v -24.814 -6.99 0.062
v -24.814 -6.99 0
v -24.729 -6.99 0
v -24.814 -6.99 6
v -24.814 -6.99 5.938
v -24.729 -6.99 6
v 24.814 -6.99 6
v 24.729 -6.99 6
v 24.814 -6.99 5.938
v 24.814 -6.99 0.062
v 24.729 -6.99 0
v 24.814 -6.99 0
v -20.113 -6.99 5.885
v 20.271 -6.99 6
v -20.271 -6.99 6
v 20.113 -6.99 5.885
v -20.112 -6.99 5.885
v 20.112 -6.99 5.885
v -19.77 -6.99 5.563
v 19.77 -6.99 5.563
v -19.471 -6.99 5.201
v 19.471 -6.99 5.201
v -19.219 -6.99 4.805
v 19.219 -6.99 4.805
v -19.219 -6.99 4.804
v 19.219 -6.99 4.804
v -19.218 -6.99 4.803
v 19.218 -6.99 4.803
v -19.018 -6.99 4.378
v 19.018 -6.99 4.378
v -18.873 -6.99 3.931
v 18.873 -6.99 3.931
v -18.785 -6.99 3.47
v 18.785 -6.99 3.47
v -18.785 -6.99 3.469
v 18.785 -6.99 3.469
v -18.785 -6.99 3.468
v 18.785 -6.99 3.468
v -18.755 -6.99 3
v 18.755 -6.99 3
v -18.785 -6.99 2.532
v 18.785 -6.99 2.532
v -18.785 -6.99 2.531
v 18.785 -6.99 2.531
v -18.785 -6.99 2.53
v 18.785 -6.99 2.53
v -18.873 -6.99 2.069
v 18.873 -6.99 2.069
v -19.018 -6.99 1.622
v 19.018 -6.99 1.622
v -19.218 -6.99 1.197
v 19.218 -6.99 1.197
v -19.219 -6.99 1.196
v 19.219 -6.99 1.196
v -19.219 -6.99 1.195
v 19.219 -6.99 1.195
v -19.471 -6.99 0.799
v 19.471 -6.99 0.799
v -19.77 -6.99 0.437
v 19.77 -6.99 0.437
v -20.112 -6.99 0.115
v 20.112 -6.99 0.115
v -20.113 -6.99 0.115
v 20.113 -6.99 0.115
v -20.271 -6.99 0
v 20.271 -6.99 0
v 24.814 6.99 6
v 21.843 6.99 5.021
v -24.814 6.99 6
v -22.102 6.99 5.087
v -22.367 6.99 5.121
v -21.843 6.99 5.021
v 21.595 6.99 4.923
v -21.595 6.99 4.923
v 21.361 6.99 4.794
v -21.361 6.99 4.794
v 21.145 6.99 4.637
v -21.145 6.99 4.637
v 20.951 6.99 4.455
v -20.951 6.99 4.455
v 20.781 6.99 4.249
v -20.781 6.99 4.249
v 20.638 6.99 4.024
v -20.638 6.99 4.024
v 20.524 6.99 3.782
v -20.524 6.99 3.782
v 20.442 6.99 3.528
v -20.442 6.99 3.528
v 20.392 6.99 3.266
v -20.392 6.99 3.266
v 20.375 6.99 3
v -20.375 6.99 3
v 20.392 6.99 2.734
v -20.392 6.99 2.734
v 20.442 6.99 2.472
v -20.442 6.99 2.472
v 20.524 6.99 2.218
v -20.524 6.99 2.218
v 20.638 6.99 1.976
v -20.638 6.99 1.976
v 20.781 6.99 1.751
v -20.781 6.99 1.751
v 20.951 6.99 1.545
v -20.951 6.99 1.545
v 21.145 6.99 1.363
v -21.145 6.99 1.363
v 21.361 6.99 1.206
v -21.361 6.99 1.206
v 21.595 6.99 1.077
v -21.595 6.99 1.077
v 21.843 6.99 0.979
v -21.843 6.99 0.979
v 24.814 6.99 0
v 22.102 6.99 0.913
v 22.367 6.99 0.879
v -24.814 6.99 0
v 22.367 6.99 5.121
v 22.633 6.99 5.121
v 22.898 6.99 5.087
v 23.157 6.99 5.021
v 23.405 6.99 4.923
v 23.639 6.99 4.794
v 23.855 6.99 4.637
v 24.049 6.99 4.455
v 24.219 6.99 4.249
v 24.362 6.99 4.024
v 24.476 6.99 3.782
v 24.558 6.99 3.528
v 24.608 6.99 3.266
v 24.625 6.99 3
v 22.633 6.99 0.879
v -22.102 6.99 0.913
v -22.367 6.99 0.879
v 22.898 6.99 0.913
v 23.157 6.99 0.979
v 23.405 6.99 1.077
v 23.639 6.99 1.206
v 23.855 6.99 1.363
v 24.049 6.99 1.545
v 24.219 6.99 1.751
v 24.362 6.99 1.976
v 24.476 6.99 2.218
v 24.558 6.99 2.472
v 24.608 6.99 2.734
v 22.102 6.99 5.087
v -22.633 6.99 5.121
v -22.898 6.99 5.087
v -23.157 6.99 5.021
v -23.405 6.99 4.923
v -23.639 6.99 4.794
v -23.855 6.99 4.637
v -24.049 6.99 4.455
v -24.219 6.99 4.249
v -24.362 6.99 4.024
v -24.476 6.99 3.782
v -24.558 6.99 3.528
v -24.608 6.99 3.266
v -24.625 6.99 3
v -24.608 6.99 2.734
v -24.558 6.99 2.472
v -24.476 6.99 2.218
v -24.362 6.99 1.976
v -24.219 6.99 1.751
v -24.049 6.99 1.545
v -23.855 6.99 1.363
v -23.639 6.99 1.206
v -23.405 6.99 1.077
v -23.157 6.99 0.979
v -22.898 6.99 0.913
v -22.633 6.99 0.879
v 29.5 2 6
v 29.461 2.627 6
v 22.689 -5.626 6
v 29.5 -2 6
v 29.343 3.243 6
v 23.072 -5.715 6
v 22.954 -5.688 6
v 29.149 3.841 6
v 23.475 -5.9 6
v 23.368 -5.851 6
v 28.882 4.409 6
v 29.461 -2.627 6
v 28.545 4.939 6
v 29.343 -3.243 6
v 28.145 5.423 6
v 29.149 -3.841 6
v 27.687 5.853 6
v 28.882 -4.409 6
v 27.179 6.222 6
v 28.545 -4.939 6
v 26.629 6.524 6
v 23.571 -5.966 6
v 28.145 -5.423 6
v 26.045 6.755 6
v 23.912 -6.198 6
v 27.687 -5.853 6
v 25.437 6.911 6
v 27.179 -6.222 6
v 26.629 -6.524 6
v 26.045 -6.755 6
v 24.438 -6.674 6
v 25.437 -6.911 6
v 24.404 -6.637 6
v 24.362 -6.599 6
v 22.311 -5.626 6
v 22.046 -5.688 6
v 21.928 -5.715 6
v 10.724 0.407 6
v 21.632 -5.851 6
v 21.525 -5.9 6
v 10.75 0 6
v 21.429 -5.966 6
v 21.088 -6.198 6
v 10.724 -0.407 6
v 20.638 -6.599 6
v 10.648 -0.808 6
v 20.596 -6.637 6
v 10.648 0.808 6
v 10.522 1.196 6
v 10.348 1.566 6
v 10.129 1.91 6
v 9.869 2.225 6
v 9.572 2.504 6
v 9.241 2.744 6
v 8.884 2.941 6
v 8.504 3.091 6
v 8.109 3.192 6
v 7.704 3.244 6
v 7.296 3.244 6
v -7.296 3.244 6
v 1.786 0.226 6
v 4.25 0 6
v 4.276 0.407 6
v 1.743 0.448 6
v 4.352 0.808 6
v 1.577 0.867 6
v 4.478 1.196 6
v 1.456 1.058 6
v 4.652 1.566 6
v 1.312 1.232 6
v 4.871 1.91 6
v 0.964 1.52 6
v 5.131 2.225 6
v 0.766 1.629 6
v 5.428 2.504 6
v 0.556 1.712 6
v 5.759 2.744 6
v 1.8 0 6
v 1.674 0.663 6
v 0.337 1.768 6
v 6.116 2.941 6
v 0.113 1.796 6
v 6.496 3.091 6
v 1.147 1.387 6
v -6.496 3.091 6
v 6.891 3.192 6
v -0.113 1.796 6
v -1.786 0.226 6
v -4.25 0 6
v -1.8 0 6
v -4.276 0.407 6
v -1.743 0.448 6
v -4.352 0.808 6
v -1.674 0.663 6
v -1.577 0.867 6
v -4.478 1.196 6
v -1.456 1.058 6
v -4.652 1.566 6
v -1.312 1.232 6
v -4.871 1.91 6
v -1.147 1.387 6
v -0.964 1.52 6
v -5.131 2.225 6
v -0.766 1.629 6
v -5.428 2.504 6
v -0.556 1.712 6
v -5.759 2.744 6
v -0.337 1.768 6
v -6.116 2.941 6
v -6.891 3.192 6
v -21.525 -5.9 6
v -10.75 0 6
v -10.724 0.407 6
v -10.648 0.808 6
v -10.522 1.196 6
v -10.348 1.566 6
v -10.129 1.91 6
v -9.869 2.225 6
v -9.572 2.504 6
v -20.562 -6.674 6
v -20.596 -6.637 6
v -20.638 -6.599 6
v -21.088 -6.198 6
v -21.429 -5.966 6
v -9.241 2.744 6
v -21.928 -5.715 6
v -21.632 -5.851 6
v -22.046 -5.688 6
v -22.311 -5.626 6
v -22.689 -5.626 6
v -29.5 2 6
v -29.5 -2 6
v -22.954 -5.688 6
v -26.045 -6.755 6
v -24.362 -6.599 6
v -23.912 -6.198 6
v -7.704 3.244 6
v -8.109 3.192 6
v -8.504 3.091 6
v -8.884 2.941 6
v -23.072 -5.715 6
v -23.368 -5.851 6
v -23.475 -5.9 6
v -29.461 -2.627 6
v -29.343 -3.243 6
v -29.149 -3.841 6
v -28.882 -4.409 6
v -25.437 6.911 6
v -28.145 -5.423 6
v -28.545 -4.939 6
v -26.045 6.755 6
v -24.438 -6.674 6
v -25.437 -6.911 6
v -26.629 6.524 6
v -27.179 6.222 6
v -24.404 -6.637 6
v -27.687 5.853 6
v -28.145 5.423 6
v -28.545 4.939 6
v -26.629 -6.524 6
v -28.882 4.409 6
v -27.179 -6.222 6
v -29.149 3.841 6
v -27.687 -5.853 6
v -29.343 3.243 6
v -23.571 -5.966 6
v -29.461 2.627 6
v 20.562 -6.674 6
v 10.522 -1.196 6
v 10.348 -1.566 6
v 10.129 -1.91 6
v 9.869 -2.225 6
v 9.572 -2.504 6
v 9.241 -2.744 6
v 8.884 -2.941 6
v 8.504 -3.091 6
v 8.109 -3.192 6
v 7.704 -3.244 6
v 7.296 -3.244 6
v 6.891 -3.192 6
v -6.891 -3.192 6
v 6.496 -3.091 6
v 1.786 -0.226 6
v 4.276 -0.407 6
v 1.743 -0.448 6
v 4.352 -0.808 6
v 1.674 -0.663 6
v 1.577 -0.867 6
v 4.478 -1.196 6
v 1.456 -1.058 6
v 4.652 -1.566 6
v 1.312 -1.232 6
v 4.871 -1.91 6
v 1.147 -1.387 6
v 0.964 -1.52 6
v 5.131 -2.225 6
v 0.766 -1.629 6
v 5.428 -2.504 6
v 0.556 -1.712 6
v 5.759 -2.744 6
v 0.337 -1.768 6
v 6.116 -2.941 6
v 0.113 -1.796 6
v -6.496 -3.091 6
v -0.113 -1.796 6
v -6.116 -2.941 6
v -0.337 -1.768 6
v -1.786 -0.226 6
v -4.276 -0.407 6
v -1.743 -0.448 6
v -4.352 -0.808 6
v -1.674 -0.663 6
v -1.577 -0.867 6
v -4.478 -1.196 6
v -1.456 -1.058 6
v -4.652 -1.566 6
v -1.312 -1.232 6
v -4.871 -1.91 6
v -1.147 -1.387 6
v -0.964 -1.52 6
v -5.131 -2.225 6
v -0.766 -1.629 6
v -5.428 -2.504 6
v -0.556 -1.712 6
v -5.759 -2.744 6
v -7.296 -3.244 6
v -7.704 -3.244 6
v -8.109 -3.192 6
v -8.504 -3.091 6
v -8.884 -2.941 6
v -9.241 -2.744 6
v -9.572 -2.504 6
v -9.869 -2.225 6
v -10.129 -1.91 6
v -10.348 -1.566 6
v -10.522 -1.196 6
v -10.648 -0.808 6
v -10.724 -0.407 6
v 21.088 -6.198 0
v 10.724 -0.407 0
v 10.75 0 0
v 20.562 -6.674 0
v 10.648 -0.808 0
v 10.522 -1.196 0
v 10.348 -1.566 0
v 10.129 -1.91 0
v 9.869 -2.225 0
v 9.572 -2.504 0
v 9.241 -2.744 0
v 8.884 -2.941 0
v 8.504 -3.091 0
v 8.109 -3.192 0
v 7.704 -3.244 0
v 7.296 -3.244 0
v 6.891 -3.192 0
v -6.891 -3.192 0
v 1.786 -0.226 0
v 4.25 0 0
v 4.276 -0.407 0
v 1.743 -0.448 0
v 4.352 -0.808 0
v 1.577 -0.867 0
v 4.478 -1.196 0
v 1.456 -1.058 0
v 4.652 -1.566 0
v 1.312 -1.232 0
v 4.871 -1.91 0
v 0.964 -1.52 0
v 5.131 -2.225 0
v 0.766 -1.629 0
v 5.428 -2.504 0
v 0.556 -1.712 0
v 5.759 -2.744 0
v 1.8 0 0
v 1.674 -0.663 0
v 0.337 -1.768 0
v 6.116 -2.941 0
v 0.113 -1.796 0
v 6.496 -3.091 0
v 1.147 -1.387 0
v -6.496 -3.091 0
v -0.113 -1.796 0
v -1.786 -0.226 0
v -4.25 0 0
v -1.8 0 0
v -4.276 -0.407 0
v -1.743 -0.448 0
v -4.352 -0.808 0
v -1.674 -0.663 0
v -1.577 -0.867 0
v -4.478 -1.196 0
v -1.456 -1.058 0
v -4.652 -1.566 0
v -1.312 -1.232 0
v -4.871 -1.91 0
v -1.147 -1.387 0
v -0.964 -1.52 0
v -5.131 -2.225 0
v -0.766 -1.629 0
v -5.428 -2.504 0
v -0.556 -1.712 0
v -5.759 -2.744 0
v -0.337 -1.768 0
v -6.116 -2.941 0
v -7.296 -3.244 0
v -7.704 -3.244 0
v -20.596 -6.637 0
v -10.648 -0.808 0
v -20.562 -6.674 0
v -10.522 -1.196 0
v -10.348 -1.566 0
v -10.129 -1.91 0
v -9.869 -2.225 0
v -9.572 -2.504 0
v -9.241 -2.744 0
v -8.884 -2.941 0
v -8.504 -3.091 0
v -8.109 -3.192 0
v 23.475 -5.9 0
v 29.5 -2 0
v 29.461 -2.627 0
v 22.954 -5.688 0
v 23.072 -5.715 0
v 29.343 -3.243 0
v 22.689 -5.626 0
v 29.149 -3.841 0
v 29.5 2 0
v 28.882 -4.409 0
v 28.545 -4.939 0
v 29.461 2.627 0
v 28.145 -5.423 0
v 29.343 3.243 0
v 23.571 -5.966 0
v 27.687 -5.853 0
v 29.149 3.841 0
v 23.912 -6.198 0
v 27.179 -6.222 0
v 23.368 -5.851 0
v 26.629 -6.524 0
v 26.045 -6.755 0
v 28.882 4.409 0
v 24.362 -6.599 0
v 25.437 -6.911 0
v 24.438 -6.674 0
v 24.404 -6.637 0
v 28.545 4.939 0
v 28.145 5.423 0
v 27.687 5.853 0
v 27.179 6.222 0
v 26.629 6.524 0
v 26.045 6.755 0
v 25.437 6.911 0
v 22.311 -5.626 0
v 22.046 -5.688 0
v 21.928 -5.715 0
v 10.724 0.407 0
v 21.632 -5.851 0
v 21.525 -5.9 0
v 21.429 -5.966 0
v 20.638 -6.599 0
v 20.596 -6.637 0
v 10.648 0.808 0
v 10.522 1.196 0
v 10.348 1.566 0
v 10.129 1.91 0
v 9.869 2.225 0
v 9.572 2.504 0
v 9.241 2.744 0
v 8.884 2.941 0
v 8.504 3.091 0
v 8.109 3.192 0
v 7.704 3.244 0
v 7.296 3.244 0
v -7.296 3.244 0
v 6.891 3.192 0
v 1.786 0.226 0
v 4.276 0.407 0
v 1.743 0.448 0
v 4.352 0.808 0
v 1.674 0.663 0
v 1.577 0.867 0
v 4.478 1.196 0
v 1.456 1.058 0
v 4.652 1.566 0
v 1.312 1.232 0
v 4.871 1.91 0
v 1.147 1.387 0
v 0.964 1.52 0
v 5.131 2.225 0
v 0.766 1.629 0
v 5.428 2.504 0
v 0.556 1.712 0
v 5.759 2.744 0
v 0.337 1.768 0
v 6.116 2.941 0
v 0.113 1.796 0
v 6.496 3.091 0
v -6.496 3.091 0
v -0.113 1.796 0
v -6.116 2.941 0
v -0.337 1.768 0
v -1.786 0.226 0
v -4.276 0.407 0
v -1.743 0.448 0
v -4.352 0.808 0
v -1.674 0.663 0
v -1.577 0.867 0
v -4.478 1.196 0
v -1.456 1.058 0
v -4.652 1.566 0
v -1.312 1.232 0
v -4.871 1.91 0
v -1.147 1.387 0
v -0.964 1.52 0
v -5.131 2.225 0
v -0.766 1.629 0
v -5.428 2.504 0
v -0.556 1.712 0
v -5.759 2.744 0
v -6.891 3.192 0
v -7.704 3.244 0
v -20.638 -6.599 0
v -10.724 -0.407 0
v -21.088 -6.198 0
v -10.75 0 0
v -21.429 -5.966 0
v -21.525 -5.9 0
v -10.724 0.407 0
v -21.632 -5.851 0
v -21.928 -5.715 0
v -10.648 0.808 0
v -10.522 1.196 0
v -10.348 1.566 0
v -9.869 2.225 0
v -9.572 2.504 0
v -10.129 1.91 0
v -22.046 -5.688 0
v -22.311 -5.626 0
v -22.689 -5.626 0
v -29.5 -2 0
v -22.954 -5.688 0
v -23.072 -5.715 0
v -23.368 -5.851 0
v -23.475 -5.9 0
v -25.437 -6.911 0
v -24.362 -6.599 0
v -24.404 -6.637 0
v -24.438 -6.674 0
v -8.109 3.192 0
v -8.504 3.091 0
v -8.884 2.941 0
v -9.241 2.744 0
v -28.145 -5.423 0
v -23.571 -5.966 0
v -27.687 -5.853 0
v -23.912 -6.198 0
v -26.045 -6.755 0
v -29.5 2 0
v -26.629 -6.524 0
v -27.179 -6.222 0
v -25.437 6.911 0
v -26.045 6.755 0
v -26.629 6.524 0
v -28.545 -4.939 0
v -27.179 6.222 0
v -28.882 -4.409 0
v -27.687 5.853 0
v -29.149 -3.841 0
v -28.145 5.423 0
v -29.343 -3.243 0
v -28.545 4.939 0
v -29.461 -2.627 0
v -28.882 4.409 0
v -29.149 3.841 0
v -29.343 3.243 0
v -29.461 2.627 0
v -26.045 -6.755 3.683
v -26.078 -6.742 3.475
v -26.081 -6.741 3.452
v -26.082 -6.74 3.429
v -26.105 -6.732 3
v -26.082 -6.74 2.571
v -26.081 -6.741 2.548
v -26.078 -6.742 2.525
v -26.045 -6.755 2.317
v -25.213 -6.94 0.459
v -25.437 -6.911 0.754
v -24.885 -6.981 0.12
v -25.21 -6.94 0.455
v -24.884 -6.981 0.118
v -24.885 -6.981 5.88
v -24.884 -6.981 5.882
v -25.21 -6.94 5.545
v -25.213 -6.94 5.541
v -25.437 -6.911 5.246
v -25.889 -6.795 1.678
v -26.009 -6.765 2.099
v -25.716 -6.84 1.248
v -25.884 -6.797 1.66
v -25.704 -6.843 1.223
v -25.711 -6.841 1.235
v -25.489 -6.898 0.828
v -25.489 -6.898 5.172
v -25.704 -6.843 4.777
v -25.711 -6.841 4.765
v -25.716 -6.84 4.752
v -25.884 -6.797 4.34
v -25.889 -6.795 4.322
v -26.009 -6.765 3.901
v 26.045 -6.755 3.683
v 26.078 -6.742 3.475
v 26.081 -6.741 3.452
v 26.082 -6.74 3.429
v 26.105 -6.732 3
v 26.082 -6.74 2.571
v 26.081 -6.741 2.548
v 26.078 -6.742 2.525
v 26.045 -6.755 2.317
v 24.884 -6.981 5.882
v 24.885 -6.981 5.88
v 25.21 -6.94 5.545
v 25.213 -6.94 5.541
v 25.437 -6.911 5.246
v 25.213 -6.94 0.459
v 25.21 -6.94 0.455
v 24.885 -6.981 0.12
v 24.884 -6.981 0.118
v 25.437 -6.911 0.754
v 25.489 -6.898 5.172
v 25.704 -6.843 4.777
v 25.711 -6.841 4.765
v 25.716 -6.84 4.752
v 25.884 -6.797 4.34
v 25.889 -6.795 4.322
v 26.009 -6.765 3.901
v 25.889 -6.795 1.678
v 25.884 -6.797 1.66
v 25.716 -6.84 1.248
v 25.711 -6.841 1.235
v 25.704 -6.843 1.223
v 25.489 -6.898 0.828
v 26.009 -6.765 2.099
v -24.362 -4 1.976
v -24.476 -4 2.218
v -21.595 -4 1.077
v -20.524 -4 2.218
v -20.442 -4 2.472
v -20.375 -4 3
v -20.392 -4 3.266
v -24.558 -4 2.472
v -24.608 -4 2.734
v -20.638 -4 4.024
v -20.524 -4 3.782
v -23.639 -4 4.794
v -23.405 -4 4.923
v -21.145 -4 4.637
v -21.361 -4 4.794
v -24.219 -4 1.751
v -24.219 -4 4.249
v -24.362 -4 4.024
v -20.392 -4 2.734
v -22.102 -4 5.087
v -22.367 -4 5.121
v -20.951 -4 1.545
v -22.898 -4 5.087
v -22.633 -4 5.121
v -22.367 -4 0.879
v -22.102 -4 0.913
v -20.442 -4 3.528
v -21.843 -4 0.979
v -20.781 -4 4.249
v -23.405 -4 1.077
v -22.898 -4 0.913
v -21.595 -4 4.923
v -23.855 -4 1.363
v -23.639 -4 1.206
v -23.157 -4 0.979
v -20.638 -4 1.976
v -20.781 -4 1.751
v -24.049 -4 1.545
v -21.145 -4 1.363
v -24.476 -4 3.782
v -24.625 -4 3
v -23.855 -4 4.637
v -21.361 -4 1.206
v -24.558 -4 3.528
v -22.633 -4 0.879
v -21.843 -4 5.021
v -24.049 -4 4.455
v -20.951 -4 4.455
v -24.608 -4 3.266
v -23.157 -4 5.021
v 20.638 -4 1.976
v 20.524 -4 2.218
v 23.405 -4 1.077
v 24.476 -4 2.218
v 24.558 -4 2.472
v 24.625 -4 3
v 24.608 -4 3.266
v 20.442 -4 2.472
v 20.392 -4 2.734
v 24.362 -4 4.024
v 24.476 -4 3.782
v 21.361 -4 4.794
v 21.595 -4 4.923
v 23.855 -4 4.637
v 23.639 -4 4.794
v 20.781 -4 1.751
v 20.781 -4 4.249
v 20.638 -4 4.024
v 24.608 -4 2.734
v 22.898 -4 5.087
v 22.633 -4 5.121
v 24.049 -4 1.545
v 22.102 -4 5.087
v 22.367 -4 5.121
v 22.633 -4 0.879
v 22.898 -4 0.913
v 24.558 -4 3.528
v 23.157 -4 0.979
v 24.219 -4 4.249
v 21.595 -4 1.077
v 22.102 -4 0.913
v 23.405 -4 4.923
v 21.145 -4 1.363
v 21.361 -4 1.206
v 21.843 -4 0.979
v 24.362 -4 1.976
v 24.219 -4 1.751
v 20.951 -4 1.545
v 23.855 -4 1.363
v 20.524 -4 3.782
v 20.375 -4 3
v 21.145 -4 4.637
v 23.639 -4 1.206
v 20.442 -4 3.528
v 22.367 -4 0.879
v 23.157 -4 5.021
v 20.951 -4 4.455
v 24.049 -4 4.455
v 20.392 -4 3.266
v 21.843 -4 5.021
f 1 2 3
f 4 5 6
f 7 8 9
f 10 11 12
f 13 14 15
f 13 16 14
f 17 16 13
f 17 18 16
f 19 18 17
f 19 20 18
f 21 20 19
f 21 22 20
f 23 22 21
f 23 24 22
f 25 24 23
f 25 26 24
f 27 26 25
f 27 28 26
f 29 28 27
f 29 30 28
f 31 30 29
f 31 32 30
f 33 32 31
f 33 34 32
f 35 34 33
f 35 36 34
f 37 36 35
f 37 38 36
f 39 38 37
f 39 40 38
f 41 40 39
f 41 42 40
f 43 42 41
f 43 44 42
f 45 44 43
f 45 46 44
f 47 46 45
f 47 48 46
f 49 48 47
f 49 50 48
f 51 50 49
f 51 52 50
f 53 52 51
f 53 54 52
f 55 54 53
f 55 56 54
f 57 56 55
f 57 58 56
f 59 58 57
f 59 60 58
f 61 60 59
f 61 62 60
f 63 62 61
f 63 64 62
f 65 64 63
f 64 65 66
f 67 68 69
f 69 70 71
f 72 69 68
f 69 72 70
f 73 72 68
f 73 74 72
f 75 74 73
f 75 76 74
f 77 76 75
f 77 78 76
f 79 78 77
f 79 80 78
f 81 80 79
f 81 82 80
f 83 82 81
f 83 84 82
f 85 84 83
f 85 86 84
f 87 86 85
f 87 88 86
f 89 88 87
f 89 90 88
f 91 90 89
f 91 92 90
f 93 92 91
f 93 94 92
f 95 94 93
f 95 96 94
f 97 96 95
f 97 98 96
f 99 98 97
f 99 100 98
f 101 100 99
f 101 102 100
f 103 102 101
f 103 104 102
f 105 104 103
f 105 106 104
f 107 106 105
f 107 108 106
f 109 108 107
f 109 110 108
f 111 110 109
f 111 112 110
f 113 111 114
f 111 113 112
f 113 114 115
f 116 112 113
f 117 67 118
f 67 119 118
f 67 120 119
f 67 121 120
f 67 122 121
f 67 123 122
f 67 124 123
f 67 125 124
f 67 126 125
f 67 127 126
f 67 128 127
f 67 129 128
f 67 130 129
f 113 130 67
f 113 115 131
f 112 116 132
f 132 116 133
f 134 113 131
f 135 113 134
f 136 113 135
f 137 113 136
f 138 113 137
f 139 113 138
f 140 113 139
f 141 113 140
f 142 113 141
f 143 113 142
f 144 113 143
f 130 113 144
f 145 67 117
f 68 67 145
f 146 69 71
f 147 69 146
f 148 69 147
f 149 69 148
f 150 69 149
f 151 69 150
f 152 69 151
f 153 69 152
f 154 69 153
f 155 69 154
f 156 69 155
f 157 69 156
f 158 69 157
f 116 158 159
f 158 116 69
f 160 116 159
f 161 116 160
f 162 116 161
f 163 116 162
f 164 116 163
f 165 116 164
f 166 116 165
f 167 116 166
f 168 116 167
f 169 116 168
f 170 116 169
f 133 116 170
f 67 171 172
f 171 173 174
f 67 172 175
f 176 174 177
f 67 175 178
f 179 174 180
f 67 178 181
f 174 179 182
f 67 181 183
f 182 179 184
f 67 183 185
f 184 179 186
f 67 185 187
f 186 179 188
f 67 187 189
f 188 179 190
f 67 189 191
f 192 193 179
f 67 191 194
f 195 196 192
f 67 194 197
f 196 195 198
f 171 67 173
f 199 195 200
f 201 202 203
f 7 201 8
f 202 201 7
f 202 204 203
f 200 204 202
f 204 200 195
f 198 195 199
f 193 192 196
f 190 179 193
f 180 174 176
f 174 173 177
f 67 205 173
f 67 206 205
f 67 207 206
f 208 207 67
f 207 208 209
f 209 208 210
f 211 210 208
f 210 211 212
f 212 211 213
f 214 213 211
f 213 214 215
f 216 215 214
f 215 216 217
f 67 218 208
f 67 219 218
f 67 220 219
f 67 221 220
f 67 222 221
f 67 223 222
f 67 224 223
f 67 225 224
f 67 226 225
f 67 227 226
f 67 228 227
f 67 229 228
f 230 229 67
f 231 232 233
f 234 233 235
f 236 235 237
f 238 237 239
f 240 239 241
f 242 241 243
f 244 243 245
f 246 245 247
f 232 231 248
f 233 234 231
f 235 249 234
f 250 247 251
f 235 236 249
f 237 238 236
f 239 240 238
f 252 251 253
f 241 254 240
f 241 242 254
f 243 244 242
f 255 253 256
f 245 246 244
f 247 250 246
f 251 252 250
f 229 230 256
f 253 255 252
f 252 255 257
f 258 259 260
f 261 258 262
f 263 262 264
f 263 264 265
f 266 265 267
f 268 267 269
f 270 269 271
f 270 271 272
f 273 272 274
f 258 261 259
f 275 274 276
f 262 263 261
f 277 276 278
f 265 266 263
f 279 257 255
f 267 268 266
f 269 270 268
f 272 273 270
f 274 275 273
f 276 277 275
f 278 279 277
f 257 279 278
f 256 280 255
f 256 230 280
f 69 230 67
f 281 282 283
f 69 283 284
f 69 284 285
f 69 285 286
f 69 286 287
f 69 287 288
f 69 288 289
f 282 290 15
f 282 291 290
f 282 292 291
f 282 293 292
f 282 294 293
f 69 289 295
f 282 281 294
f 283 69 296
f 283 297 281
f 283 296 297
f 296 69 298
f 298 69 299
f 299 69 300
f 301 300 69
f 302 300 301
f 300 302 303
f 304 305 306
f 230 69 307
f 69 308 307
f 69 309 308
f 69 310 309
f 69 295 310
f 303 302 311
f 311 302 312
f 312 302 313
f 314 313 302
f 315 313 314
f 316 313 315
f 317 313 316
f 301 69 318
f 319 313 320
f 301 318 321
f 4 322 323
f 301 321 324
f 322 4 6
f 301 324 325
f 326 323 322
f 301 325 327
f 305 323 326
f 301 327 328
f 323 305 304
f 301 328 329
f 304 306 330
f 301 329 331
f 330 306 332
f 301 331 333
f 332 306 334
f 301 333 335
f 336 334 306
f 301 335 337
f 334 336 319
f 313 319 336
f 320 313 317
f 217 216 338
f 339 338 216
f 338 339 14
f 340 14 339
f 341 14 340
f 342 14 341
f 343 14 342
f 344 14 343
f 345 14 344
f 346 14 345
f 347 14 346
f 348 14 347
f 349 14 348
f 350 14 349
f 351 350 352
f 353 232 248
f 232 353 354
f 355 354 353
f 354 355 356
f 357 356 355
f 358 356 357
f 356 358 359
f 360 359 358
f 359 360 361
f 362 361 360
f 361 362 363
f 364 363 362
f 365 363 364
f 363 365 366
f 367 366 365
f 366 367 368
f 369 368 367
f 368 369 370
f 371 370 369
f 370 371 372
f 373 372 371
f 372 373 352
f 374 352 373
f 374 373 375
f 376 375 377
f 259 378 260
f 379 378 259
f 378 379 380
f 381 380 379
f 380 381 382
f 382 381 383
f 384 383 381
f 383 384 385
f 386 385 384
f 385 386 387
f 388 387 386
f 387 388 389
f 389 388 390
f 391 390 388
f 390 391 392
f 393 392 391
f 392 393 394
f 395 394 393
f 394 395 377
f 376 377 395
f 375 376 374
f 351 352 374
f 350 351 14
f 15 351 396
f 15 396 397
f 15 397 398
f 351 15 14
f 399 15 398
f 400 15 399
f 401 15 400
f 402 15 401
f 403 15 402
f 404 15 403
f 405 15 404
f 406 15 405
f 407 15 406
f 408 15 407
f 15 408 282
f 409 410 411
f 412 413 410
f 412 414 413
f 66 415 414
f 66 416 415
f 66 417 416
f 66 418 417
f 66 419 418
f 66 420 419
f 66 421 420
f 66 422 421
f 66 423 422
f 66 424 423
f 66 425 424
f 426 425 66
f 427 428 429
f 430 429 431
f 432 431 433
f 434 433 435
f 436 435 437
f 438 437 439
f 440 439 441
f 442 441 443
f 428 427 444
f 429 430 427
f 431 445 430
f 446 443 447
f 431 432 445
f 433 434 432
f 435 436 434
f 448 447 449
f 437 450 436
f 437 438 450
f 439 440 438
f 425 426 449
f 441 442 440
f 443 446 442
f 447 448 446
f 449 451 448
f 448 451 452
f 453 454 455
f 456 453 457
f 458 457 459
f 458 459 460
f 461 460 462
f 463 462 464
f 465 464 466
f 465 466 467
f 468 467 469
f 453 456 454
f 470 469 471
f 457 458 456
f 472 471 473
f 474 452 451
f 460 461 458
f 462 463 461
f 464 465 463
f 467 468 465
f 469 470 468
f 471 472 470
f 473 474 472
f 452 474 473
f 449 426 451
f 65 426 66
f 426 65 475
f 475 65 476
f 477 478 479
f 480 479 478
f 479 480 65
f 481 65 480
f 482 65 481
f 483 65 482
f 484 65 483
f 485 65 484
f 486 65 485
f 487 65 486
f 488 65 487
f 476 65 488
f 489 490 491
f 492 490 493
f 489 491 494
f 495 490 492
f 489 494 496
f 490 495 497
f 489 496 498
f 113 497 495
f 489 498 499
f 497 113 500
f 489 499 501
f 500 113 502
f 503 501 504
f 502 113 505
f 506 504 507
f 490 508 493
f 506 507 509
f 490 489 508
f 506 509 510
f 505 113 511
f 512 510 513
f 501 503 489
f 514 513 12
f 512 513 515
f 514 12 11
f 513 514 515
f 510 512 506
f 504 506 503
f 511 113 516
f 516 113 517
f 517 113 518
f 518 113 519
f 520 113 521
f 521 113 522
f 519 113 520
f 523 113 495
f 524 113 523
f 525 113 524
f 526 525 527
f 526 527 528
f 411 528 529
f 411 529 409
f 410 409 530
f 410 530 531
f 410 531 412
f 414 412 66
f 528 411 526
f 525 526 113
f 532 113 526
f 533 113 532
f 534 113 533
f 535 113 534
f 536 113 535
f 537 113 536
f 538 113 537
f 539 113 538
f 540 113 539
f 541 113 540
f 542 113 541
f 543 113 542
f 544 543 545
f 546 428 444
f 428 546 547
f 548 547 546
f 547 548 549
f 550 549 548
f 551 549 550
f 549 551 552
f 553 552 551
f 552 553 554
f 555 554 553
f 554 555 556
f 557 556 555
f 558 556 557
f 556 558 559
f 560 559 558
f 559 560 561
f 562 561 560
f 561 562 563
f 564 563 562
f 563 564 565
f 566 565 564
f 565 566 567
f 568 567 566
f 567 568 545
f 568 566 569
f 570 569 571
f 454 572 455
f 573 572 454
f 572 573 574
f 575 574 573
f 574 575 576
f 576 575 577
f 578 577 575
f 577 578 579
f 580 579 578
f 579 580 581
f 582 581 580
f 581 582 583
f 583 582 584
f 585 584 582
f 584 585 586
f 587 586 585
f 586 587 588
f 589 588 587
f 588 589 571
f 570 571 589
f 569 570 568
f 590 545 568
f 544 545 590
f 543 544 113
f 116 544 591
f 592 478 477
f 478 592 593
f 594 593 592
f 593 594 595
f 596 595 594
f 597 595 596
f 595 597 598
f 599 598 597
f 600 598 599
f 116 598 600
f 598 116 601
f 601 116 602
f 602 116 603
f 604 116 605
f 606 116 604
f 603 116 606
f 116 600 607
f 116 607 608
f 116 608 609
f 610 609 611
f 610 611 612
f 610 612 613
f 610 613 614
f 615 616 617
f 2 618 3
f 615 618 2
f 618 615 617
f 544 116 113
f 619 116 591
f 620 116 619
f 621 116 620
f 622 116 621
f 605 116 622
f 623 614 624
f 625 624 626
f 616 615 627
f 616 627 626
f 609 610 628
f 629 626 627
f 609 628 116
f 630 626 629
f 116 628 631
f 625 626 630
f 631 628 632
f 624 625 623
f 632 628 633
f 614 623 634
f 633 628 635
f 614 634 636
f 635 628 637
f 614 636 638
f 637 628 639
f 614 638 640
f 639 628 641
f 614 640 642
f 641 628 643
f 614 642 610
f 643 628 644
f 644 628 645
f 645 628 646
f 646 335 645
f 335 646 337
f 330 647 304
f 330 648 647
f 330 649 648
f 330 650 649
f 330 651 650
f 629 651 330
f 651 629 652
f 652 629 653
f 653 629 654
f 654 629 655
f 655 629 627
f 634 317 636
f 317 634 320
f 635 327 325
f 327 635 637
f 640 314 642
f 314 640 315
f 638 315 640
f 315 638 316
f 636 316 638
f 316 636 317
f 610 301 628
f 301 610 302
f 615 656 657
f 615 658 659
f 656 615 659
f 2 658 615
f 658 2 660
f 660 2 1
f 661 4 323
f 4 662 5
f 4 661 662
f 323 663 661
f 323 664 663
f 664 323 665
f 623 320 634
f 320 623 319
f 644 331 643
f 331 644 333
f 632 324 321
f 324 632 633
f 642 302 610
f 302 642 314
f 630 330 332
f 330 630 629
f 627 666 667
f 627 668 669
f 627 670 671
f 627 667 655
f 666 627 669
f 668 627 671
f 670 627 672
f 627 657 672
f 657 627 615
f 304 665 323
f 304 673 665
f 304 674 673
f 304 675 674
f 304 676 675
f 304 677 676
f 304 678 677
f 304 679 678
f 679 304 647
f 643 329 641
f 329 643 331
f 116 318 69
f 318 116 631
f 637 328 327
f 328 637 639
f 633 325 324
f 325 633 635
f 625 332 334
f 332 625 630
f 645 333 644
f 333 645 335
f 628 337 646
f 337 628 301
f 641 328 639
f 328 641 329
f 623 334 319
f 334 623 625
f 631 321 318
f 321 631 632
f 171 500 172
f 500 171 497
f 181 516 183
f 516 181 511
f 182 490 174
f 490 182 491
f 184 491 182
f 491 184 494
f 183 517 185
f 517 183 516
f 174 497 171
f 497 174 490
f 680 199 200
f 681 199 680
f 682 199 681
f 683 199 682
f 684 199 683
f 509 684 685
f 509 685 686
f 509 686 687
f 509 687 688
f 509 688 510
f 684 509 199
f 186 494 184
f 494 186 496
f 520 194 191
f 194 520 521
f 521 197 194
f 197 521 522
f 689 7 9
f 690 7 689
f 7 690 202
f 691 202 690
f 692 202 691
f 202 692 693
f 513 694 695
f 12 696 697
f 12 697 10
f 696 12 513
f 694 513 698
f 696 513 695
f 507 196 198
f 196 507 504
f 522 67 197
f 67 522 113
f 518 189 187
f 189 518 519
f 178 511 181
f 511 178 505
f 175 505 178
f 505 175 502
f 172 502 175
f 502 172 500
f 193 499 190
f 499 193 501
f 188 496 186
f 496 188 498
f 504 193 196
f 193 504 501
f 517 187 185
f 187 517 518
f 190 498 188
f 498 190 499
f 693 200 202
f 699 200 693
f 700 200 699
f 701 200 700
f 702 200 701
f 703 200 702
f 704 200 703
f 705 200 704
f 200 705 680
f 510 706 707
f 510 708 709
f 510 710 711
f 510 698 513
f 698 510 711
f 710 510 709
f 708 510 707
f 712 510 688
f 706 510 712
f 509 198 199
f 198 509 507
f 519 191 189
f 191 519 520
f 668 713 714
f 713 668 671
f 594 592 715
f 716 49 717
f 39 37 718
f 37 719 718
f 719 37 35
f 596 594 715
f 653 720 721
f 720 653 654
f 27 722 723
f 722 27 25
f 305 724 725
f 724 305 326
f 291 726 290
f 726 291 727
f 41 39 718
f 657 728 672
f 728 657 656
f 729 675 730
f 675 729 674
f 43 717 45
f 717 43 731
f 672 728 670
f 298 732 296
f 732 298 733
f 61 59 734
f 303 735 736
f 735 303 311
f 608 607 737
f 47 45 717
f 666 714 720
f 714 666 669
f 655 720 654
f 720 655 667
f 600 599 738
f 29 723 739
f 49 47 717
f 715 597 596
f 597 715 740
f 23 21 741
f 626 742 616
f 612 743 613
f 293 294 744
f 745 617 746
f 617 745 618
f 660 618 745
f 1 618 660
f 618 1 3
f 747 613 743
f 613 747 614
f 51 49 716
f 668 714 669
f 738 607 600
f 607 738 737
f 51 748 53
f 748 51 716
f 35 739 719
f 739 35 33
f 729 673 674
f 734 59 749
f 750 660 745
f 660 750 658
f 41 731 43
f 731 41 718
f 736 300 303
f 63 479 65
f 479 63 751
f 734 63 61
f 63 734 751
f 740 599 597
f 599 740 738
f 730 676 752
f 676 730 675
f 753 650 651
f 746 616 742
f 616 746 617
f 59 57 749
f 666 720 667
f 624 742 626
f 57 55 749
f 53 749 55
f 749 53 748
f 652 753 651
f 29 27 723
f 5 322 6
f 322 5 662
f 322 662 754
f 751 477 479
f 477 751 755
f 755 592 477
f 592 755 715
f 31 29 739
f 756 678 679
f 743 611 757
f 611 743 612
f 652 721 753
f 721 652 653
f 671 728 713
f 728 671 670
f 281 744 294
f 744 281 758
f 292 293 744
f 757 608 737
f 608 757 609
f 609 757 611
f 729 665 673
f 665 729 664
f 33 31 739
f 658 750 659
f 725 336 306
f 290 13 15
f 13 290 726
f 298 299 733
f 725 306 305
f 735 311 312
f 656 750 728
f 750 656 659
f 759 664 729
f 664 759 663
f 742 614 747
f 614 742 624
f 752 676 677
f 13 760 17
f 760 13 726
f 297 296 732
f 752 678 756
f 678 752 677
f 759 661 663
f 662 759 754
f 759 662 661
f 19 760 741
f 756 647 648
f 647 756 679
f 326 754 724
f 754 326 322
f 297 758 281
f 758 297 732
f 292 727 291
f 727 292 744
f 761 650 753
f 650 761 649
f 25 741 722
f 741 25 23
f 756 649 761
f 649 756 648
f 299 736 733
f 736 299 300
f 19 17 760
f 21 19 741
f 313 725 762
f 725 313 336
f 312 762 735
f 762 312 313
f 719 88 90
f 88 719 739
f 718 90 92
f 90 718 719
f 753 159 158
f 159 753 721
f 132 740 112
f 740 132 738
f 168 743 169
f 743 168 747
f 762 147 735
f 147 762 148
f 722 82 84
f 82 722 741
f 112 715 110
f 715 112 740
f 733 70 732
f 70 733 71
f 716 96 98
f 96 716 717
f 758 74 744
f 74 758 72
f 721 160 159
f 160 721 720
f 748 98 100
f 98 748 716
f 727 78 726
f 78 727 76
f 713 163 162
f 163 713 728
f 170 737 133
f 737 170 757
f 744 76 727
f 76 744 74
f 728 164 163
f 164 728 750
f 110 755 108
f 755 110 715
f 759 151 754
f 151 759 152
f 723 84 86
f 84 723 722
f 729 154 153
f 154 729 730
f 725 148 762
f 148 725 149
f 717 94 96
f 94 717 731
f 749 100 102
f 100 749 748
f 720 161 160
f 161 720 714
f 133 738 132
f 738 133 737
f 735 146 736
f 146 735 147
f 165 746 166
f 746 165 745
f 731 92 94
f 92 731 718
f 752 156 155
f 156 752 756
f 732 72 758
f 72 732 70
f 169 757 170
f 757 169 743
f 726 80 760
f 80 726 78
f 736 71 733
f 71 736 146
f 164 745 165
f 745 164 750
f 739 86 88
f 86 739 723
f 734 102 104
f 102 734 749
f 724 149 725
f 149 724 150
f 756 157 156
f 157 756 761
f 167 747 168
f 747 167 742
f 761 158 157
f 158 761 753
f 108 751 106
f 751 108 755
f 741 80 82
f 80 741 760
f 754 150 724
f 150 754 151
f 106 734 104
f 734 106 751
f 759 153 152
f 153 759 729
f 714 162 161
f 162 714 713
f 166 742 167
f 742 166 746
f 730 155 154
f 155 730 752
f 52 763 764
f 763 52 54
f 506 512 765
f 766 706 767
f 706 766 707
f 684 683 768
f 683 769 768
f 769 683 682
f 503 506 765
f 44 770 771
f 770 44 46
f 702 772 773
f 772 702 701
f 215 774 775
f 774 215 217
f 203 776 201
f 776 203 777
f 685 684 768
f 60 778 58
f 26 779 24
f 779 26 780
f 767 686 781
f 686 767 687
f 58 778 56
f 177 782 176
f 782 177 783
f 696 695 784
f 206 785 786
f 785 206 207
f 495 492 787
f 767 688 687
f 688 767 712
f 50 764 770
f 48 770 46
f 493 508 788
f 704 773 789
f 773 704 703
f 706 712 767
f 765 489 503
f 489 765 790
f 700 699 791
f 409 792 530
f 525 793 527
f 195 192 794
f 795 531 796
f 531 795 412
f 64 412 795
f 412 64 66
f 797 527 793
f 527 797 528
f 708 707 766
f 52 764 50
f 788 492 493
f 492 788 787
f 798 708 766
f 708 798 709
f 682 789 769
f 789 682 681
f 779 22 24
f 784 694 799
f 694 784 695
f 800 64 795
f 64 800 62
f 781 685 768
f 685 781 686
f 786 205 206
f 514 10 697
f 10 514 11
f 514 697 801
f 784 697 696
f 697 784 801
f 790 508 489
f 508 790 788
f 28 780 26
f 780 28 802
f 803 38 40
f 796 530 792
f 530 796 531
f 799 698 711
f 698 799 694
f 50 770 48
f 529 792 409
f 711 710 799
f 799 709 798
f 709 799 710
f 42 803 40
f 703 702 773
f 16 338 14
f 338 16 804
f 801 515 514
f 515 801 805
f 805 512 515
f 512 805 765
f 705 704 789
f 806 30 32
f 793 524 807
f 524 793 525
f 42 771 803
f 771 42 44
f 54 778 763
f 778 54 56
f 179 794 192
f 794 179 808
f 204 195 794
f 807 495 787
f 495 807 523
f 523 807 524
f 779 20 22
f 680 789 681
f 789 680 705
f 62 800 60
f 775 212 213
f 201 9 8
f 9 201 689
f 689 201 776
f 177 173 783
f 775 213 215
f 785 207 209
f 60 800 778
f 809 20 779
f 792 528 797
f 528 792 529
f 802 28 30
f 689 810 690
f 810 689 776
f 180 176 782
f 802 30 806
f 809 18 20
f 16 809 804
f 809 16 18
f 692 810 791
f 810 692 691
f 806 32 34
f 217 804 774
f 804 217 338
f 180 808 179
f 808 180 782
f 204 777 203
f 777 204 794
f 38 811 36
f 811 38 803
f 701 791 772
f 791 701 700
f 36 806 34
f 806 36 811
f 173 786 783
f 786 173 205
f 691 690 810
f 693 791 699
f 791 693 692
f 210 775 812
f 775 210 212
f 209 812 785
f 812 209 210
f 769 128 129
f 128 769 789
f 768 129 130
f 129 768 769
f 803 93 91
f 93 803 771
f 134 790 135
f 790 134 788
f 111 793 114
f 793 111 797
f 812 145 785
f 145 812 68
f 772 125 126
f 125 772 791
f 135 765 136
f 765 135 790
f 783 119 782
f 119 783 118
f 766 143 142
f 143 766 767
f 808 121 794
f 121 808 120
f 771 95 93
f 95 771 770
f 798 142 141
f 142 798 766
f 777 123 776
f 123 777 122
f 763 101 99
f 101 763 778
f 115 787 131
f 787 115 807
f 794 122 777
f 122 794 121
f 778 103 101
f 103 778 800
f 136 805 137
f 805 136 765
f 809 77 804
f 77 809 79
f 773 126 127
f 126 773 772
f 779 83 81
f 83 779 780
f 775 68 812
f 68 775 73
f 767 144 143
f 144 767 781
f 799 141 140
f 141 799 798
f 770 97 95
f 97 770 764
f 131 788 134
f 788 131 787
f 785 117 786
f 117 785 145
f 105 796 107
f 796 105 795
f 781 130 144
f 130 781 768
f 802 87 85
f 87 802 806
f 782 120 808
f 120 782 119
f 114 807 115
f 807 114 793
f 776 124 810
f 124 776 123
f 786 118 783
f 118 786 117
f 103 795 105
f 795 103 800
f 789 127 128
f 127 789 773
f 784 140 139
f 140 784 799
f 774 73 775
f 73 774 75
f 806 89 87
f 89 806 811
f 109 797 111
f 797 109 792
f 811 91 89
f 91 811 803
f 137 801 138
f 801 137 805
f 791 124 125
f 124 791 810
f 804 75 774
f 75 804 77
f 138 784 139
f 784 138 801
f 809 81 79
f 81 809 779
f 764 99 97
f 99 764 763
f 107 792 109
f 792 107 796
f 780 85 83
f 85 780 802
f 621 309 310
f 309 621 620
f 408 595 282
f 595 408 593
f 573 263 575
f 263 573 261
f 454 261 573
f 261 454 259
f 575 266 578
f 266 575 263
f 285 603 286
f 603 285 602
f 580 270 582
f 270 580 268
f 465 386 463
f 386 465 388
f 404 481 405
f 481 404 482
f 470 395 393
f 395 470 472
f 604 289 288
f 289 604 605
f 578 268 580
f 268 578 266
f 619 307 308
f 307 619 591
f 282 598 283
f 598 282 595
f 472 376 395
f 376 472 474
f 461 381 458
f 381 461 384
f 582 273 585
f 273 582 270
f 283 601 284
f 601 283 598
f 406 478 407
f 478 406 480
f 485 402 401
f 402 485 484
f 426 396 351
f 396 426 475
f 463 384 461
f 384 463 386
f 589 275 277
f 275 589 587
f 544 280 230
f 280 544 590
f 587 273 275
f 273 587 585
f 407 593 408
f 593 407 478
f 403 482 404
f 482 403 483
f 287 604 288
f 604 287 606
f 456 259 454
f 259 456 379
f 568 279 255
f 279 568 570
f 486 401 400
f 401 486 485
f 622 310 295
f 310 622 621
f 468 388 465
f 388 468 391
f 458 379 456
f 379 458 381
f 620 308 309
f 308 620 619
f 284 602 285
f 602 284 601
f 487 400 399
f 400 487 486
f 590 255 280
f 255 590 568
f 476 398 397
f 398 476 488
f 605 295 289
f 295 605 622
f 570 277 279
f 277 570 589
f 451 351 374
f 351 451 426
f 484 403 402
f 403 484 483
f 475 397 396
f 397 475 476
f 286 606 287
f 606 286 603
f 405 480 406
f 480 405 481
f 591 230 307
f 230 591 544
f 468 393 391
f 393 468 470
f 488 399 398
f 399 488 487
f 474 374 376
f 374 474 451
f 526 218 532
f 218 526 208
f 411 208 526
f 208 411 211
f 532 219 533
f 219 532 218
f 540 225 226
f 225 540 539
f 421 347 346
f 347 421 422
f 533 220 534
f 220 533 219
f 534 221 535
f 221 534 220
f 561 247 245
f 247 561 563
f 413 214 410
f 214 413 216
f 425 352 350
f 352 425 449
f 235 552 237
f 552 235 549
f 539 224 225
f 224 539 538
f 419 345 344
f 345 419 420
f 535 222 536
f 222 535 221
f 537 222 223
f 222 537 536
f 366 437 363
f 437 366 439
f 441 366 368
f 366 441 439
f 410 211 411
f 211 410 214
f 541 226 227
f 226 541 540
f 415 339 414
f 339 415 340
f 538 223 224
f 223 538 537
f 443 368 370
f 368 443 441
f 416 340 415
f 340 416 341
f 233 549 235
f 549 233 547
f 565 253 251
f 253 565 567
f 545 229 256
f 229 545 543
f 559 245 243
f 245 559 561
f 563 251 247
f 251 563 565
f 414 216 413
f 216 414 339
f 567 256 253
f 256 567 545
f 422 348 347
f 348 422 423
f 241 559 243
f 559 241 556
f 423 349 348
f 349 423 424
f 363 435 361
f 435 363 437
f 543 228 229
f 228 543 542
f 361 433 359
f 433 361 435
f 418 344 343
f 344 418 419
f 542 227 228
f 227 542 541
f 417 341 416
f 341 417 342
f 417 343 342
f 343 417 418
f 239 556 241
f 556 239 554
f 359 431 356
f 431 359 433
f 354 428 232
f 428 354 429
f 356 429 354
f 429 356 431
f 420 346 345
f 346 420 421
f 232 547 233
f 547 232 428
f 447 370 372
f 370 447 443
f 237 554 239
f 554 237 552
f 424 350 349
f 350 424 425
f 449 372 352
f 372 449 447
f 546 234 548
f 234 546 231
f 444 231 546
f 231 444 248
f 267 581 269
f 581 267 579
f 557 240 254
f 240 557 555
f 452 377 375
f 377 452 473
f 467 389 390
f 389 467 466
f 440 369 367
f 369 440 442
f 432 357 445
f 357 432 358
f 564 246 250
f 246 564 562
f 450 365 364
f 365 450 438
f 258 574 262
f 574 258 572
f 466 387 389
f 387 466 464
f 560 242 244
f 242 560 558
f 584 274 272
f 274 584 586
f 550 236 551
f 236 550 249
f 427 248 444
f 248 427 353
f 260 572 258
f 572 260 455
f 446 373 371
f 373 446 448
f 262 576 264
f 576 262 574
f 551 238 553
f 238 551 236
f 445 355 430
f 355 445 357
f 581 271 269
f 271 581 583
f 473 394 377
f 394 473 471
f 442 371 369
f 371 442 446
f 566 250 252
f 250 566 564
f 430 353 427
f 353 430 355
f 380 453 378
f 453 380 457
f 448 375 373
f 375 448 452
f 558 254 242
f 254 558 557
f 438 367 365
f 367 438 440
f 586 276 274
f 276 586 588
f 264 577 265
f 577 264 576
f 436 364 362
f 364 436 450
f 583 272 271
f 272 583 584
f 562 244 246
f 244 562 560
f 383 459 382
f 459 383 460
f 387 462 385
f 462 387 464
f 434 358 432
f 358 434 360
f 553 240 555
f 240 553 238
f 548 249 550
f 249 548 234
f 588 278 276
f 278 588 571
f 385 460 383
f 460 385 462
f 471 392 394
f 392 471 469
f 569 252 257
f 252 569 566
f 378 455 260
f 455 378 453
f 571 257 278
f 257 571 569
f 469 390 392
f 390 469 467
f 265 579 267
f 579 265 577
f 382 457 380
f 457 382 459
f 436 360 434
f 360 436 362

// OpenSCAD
$fn = 50;


difference() {
	union() {
		hull() {
			translate(v = [-9.5000000000, 2.0000000000, 0]) {
				cylinder(h = 6, r = 5);
			}
			translate(v = [9.5000000000, 2.0000000000, 0]) {
				cylinder(h = 6, r = 5);
			}
			translate(v = [-9.5000000000, -2.0000000000, 0]) {
				cylinder(h = 6, r = 5);
			}
			translate(v = [9.5000000000, -2.0000000000, 0]) {
				cylinder(h = 6, r = 5);
			}
		}
		translate(v = [-15.0000000000, 0.0000000000, 0]) {
			hull() {
				translate(v = [-9.5000000000, 2.0000000000, 0]) {
					cylinder(h = 6, r = 5);
				}
				translate(v = [9.5000000000, 2.0000000000, 0]) {
					cylinder(h = 6, r = 5);
				}
				translate(v = [-9.5000000000, -2.0000000000, 0]) {
					cylinder(h = 6, r = 5);
				}
				translate(v = [9.5000000000, -2.0000000000, 0]) {
					cylinder(h = 6, r = 5);
				}
			}
		}
		translate(v = [15.0000000000, 0.0000000000, 0]) {
			hull() {
				translate(v = [-9.5000000000, 2.0000000000, 0]) {
					cylinder(h = 6, r = 5);
				}
				translate(v = [9.5000000000, 2.0000000000, 0]) {
					cylinder(h = 6, r = 5);
				}
				translate(v = [-9.5000000000, -2.0000000000, 0]) {
					cylinder(h = 6, r = 5);
				}
				translate(v = [9.5000000000, -2.0000000000, 0]) {
					cylinder(h = 6, r = 5);
				}
			}
		}
	}
	union() {
		translate(v = [-22.5000000000, -7.0000000000, 3.0000000000]) {
			rotate(a = [90, 0, 0]) {
				difference() {
					union() {
						#translate(v = [0, 0, -14.0000000000]) {
							cylinder(h = 14, r = 2.0000000000);
						}
						#translate(v = [0, 0, -3]) {
							cylinder(h = 3, r1 = 2.1250000000, r2 = 3.7500000000);
						}
						#translate(v = [0, 0, -14.0000000000]) {
							cylinder(h = 14, r = 2.1250000000);
						}
						#translate(v = [0, 0, -14.0000000000]) {
							cylinder(h = 14, r = 2.0000000000);
						}
					}
					union();
				}
			}
		}
		translate(v = [22.5000000000, -7.0000000000, 3.0000000000]) {
			rotate(a = [90, 0, 0]) {
				difference() {
					union() {
						#translate(v = [0, 0, -14.0000000000]) {
							cylinder(h = 14, r = 2.0000000000);
						}
						#translate(v = [0, 0, -3]) {
							cylinder(h = 3, r1 = 2.1250000000, r2 = 3.7500000000);
						}
						#translate(v = [0, 0, -14.0000000000]) {
							cylinder(h = 14, r = 2.1250000000);
						}
						#translate(v = [0, 0, -14.0000000000]) {
							cylinder(h = 14, r = 2.0000000000);
						}
					}
					union();
				}
			}
		}
		translate(v = [-7.5000000000, 0.0000000000, 0]) {
			translate(v = [0, 0, -100]) {
				cylinder(h = 200, r = 3.2500000000);
			}
		}
		translate(v = [7.5000000000, 0.0000000000, 0]) {
			translate(v = [0, 0, -100]) {
				cylinder(h = 200, r = 3.2500000000);
			}
		}
		translate(v = [-7.5000000000, 0.0000000000, 0]) {
			translate(v = [0, 0, -100]) {
				cylinder(h = 200, r = 1.8000000000);
			}
		}
		translate(v = [0, 0, -100]) {
			cylinder(h = 200, r = 1.8000000000);
		}
		translate(v = [7.5000000000, 0.0000000000, 0]) {
			translate(v = [0, 0, -100]) {
				cylinder(h = 200, r = 1.8000000000);
			}
		}
	}
}
